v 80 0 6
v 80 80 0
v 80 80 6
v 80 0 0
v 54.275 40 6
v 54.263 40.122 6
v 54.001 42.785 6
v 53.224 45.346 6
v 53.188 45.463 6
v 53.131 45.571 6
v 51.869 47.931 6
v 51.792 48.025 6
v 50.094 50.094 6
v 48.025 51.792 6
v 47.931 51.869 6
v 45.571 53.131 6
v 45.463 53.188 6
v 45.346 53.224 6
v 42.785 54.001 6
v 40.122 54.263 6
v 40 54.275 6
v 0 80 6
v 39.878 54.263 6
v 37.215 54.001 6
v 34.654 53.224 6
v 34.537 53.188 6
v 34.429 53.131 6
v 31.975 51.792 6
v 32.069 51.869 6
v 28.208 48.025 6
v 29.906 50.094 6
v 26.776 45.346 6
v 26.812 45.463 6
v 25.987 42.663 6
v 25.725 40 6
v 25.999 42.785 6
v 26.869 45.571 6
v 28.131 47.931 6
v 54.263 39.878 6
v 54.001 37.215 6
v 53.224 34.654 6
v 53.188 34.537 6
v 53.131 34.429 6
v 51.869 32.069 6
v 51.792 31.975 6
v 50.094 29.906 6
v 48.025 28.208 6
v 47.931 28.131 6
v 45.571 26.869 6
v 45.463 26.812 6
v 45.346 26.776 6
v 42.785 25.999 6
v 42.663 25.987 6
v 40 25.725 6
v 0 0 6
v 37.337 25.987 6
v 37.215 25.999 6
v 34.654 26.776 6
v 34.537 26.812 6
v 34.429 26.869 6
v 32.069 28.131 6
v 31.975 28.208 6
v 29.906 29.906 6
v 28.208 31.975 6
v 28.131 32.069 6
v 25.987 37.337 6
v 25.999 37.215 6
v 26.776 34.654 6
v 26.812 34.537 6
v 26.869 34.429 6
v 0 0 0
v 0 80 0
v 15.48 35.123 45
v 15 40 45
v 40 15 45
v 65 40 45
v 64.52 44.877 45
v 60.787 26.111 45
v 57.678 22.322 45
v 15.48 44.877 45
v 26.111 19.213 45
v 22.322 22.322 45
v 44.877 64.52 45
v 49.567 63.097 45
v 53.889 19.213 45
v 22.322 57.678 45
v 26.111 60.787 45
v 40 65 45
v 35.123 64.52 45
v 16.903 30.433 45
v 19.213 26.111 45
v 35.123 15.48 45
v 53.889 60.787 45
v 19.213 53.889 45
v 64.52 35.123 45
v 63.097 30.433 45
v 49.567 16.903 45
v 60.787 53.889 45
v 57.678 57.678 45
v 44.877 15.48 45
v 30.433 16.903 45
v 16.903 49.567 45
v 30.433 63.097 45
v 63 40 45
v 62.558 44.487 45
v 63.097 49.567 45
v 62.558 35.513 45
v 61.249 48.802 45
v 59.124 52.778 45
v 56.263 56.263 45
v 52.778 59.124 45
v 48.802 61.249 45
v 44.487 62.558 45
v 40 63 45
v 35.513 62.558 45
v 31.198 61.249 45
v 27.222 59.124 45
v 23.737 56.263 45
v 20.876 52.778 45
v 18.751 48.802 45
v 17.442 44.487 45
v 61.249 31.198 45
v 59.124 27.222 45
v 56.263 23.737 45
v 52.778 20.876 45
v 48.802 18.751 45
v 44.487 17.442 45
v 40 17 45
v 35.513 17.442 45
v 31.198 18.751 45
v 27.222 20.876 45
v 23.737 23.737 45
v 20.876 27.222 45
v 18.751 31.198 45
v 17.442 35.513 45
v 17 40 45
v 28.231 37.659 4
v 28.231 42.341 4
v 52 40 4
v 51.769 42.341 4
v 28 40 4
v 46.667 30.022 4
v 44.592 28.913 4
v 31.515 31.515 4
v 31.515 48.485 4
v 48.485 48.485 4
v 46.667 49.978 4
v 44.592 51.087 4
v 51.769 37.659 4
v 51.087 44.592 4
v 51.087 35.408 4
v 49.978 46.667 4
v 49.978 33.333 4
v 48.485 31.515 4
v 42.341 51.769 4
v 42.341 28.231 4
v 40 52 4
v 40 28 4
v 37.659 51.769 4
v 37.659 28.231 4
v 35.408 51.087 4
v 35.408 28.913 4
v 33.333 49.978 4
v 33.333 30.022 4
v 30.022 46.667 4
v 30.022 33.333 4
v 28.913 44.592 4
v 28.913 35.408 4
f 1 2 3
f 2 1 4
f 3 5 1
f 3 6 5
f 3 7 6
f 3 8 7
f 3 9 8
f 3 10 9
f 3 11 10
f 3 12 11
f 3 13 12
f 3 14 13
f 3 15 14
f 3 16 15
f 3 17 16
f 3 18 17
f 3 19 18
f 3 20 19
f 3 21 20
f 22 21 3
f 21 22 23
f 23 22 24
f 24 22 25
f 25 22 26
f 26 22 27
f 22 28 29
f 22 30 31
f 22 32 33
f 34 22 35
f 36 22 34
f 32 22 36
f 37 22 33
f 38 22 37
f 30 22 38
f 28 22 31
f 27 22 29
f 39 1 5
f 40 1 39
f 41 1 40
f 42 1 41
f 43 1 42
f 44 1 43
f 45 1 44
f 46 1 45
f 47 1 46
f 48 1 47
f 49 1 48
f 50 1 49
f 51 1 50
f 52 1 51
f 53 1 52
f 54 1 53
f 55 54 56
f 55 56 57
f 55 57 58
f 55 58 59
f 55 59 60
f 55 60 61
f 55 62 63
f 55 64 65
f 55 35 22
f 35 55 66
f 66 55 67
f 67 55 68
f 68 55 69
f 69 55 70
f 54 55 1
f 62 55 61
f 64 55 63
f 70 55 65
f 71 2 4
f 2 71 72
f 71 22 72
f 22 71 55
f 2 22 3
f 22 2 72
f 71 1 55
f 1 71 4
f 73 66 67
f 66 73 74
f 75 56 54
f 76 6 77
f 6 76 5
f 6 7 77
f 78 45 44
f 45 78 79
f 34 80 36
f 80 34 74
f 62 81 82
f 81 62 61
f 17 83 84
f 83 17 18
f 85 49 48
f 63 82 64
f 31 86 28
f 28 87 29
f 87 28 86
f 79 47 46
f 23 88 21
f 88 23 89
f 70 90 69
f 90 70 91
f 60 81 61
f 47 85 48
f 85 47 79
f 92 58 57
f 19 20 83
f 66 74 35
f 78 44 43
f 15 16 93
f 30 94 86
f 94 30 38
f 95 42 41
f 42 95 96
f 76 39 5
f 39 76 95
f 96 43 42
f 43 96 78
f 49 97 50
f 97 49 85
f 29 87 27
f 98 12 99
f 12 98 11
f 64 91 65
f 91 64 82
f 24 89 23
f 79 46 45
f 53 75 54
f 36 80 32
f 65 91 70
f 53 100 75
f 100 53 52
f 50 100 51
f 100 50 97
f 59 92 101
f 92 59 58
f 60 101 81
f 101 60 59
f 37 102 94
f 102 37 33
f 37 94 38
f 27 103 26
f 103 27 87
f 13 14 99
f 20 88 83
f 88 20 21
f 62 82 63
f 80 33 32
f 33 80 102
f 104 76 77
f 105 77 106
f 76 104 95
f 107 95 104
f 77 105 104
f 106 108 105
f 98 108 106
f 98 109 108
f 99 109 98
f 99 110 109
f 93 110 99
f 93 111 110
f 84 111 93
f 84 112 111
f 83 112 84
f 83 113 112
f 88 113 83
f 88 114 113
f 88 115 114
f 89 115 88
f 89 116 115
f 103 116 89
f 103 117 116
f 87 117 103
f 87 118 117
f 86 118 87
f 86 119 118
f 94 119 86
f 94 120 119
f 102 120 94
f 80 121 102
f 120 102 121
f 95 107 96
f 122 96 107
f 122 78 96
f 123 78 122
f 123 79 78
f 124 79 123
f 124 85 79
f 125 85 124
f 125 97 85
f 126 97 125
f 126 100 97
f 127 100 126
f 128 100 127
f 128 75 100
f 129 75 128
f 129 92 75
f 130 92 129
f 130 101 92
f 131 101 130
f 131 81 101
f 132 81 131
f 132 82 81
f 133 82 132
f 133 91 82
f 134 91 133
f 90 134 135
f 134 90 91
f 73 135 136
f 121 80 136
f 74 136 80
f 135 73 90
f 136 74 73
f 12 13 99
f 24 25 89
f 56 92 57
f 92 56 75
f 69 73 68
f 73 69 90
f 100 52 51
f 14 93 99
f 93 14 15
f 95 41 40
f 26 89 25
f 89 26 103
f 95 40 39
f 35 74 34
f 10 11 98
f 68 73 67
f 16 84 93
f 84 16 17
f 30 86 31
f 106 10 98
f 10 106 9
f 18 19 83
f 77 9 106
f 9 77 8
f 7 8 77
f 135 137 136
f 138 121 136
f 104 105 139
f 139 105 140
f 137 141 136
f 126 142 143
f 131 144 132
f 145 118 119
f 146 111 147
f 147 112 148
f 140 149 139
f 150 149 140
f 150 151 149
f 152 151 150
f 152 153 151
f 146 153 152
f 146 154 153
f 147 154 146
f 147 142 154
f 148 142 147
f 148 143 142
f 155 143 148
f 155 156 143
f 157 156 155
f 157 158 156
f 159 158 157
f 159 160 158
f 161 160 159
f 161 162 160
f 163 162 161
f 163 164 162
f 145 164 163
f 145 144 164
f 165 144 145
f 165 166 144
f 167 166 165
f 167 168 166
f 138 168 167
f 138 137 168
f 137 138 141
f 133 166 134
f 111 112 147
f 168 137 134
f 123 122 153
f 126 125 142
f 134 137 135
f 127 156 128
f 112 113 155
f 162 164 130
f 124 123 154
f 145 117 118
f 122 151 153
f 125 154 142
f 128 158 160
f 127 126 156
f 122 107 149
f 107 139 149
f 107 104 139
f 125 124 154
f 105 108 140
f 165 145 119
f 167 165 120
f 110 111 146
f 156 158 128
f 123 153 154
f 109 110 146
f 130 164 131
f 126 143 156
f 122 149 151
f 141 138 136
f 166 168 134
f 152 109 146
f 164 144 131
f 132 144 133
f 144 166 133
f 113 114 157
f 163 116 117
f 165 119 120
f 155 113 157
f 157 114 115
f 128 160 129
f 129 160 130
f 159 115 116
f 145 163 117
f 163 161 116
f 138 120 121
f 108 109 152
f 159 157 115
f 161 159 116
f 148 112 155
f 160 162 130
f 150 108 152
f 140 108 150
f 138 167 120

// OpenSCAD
$fn = 32;

// ----------------------------------------------------------------------
// Hopper: funnel with square flange
// ----------------------------------------------------------------------

// --- parameters (mm) ---
fl = 80;                  // flange side, X and Y
fl_t = 6;                 // flange thickness
cone_h = 40;              // cone height above the flange
top_d = 50;               // cone mouth diameter
bot_d = 28;               // cone spout diameter
wall = 2;                 // cone wall thickness

bore_d = bot_d - 2 * wall;  // spout bore diameter
total_h = fl_t + cone_h - 1;  // overall height

difference() {
  union() {
    cube([fl, fl, fl_t]);
    translate([fl / 2, fl / 2, fl_t - 1])
      cylinder(h = cone_h, d1 = bot_d, d2 = top_d);
  }
  translate([fl / 2, fl / 2, fl_t - 2])
    cylinder(h = cone_h + 1, d1 = bore_d, d2 = top_d - 2 * wall);
}
